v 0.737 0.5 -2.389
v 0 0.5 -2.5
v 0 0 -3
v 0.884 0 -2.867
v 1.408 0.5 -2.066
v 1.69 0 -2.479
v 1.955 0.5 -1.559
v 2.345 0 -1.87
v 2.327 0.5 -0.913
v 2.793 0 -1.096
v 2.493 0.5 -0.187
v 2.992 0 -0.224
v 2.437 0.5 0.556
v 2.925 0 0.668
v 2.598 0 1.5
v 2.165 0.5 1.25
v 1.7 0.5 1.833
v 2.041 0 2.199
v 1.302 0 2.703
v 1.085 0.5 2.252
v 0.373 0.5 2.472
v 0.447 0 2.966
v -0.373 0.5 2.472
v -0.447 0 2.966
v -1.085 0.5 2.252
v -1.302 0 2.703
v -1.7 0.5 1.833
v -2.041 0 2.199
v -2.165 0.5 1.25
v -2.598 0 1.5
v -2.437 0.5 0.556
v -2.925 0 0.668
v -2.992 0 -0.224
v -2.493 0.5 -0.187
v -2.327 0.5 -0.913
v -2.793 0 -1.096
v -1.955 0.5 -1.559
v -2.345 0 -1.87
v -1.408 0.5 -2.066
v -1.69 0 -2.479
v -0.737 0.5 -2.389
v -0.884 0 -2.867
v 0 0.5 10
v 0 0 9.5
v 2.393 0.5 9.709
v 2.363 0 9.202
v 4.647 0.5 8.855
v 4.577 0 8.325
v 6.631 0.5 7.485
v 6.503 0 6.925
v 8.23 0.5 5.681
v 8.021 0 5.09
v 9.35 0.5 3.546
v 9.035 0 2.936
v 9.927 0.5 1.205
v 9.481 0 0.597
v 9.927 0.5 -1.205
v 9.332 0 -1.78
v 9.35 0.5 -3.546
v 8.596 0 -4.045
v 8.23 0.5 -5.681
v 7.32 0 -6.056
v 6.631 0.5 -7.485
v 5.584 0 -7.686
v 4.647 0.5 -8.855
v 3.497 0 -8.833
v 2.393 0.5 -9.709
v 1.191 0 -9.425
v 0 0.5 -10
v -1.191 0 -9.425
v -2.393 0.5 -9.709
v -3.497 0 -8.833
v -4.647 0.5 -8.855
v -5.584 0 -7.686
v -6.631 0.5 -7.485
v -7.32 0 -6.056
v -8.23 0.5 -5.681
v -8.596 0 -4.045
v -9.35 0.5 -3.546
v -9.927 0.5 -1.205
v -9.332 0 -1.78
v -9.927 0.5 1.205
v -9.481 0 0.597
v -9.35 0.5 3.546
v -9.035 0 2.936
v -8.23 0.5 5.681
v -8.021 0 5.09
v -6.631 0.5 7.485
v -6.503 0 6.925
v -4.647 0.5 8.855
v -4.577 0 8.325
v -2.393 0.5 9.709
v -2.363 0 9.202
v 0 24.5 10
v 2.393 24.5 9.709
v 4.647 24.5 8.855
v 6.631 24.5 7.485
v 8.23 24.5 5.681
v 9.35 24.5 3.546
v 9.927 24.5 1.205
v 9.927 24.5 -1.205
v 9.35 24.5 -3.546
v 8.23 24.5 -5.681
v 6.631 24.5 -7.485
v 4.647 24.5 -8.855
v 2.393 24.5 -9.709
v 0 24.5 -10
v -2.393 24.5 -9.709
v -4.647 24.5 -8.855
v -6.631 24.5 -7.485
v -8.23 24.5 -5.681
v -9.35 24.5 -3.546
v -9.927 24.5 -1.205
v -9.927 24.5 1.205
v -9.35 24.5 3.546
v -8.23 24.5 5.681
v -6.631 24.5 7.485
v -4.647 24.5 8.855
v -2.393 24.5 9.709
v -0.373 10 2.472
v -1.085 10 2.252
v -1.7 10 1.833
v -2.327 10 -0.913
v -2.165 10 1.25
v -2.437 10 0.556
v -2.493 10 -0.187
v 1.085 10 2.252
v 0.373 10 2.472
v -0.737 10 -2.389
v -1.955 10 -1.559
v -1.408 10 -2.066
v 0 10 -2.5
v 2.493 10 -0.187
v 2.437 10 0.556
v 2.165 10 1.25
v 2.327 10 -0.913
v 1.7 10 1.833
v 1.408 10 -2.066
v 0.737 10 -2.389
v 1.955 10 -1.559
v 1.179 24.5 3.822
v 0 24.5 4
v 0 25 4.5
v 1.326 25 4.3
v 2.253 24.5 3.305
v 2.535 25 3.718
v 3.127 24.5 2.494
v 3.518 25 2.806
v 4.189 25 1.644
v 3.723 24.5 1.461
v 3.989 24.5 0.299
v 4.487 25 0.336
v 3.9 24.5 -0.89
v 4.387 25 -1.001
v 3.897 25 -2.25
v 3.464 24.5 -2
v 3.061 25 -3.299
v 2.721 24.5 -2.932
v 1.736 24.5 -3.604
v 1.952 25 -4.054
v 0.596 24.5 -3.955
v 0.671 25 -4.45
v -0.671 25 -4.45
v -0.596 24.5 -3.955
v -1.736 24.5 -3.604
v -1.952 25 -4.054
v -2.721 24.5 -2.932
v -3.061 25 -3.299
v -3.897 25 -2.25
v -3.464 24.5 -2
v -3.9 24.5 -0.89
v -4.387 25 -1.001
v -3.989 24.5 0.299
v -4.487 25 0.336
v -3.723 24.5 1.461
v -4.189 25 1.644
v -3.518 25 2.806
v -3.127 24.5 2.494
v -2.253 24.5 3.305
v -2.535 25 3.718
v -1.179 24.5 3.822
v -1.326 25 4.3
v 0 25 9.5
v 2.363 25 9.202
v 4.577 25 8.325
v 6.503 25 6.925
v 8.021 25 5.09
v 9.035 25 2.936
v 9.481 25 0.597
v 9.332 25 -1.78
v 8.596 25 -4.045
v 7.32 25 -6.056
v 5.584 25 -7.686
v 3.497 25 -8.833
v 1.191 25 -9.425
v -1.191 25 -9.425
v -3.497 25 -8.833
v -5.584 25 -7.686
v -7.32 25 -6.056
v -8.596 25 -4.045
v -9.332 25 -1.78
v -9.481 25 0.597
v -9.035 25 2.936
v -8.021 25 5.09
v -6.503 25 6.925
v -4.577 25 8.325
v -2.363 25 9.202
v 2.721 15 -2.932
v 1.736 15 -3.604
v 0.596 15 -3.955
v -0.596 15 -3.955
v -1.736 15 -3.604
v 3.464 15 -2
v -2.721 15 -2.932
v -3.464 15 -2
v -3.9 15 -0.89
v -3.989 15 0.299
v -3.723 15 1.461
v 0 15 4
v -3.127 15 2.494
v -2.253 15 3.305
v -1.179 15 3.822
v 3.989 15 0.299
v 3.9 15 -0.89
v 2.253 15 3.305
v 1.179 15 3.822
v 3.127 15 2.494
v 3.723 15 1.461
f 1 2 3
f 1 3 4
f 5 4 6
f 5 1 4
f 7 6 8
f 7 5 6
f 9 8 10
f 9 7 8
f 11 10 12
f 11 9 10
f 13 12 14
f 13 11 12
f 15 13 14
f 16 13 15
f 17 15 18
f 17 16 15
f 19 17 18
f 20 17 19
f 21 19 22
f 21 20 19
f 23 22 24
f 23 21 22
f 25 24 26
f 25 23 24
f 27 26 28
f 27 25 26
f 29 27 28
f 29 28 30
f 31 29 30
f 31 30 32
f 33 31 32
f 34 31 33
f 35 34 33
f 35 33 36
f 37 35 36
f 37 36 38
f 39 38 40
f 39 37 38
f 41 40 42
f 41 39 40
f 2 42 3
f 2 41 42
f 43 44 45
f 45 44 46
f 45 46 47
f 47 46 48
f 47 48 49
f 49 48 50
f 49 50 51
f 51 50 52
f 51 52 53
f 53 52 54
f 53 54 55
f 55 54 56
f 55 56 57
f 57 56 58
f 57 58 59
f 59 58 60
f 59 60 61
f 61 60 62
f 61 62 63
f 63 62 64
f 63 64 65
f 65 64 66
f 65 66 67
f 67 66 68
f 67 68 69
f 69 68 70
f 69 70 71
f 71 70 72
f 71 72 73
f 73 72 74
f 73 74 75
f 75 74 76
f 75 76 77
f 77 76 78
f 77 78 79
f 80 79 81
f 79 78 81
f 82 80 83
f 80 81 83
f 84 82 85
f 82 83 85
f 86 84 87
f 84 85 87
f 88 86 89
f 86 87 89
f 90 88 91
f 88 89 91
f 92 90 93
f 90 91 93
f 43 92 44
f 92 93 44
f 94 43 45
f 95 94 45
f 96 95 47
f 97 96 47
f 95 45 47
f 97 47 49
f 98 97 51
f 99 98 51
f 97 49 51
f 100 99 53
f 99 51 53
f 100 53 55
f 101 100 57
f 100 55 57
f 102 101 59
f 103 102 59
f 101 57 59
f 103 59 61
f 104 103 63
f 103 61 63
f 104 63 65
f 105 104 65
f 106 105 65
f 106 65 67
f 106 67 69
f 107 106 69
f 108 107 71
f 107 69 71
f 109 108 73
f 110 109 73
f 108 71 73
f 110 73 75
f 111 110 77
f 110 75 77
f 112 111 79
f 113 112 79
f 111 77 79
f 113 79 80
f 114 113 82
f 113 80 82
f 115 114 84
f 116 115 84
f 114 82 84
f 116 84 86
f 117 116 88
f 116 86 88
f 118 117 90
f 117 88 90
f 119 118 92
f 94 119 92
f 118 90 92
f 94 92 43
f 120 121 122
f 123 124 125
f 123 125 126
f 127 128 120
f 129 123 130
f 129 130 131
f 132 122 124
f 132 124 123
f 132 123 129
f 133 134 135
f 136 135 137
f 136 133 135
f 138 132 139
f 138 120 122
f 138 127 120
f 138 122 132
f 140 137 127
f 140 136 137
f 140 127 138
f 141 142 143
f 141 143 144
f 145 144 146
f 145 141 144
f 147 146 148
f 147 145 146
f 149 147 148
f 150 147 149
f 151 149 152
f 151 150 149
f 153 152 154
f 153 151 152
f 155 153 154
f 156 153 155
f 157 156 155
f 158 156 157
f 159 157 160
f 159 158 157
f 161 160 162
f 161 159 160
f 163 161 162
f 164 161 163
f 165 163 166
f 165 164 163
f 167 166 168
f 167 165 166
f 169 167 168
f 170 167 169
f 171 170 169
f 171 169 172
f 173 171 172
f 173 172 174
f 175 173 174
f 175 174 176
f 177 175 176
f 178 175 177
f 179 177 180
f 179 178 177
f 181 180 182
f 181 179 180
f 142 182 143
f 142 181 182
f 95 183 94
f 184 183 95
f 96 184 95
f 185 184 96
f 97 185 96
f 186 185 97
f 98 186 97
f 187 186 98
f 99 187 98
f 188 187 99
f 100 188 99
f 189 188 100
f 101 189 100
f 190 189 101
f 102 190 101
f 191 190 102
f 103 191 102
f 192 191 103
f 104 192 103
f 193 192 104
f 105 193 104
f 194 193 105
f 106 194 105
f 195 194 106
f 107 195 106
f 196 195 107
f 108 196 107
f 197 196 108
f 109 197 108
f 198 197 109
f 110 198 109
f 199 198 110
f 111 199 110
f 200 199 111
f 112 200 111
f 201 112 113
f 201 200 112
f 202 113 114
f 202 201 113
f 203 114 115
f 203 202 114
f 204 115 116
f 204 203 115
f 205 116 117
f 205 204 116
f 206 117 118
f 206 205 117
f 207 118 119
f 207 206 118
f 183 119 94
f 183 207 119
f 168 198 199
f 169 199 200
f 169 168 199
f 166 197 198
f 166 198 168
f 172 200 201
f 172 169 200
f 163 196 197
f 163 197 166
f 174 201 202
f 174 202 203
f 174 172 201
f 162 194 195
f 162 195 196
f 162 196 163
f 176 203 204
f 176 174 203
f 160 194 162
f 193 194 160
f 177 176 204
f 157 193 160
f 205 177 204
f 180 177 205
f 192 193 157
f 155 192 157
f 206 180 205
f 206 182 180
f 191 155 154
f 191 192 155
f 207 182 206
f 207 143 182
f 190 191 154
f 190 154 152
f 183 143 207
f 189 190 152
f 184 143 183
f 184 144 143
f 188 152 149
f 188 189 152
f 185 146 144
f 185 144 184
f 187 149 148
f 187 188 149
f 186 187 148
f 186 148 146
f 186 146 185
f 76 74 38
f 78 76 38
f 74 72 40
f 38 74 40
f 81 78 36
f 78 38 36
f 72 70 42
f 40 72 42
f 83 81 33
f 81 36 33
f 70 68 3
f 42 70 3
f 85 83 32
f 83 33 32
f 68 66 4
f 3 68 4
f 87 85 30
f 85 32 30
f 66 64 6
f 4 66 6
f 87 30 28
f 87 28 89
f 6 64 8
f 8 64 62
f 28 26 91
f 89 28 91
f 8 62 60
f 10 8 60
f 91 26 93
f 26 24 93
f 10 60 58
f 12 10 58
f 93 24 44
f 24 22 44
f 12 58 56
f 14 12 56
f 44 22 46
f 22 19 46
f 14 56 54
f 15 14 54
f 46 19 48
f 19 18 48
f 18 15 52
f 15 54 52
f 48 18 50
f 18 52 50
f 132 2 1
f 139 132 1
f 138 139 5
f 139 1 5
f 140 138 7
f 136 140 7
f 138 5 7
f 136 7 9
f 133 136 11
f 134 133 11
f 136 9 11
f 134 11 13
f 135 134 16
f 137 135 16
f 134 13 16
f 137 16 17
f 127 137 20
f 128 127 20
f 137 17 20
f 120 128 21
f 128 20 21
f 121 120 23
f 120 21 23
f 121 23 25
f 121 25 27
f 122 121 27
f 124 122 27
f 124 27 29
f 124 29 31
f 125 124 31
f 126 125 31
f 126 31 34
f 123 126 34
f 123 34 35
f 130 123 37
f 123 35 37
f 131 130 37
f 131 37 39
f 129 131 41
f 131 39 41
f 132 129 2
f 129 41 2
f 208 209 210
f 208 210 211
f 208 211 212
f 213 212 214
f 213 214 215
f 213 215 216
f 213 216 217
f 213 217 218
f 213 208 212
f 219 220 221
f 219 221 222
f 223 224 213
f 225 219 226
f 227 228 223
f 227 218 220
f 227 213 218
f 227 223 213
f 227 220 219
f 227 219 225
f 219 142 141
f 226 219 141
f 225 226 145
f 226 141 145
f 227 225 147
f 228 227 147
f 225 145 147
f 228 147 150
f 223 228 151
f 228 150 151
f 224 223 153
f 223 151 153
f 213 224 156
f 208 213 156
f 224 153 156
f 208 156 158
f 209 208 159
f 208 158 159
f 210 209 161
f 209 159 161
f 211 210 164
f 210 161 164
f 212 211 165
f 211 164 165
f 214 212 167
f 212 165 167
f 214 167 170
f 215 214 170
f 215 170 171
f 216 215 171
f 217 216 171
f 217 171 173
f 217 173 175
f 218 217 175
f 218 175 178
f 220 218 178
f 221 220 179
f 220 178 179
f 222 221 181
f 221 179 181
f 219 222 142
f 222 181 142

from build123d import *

# Parameters (mm, degrees)
SKETCH1_R           = 10
BOSS_EXTRUDE1_DEPTH = 25
SKETCH2_R           = 4
CUT_EXTRUDE1_DEPTH  = 10
SKETCH3_R           = 2.5
CUT_EXTRUDE2_DEPTH  = 10
CHAMFER1_SIZE       = 0.5


with BuildPart() as part:
    # Sketch1 → Boss-Extrude1 (new body)
    with BuildSketch(Plane(origin=(0, 0, 0), x_dir=(1, 0, 0), z_dir=(0, 1, 0))):
        with Locations(Location((0, 0, 0), (0, 0, 270))):
            Circle(SKETCH1_R)
    extrude(amount=BOSS_EXTRUDE1_DEPTH)

    # Sketch2 → Cut-Extrude1 (cut)
    with BuildSketch(Plane(origin=(0, 25, 0), x_dir=(1, 0, 0), z_dir=(0, 1, 0))):
        with Locations(Location((0, 0, 0), (0, 0, 270))):
            Circle(SKETCH2_R)
    extrude(amount=-CUT_EXTRUDE1_DEPTH, mode=Mode.SUBTRACT)

    # Sketch3 → Cut-Extrude2 (cut)
    with BuildSketch(Plane.XZ):
        with Locations(Location((0, 0, 0), (0, 0, 270))):
            Circle(SKETCH3_R)
    extrude(amount=-CUT_EXTRUDE2_DEPTH, mode=Mode.SUBTRACT)

    # Chamfer1
    chamfer1_edges = [part.edges().sort_by_distance(p)[0] for p in [
        (0, 0, 2.5),
        (0, 0, -10),
        (0, 25, -10),
        (0, 25, -4),
    ]]
    chamfer(chamfer1_edges, length=CHAMFER1_SIZE)


solid = part.part
